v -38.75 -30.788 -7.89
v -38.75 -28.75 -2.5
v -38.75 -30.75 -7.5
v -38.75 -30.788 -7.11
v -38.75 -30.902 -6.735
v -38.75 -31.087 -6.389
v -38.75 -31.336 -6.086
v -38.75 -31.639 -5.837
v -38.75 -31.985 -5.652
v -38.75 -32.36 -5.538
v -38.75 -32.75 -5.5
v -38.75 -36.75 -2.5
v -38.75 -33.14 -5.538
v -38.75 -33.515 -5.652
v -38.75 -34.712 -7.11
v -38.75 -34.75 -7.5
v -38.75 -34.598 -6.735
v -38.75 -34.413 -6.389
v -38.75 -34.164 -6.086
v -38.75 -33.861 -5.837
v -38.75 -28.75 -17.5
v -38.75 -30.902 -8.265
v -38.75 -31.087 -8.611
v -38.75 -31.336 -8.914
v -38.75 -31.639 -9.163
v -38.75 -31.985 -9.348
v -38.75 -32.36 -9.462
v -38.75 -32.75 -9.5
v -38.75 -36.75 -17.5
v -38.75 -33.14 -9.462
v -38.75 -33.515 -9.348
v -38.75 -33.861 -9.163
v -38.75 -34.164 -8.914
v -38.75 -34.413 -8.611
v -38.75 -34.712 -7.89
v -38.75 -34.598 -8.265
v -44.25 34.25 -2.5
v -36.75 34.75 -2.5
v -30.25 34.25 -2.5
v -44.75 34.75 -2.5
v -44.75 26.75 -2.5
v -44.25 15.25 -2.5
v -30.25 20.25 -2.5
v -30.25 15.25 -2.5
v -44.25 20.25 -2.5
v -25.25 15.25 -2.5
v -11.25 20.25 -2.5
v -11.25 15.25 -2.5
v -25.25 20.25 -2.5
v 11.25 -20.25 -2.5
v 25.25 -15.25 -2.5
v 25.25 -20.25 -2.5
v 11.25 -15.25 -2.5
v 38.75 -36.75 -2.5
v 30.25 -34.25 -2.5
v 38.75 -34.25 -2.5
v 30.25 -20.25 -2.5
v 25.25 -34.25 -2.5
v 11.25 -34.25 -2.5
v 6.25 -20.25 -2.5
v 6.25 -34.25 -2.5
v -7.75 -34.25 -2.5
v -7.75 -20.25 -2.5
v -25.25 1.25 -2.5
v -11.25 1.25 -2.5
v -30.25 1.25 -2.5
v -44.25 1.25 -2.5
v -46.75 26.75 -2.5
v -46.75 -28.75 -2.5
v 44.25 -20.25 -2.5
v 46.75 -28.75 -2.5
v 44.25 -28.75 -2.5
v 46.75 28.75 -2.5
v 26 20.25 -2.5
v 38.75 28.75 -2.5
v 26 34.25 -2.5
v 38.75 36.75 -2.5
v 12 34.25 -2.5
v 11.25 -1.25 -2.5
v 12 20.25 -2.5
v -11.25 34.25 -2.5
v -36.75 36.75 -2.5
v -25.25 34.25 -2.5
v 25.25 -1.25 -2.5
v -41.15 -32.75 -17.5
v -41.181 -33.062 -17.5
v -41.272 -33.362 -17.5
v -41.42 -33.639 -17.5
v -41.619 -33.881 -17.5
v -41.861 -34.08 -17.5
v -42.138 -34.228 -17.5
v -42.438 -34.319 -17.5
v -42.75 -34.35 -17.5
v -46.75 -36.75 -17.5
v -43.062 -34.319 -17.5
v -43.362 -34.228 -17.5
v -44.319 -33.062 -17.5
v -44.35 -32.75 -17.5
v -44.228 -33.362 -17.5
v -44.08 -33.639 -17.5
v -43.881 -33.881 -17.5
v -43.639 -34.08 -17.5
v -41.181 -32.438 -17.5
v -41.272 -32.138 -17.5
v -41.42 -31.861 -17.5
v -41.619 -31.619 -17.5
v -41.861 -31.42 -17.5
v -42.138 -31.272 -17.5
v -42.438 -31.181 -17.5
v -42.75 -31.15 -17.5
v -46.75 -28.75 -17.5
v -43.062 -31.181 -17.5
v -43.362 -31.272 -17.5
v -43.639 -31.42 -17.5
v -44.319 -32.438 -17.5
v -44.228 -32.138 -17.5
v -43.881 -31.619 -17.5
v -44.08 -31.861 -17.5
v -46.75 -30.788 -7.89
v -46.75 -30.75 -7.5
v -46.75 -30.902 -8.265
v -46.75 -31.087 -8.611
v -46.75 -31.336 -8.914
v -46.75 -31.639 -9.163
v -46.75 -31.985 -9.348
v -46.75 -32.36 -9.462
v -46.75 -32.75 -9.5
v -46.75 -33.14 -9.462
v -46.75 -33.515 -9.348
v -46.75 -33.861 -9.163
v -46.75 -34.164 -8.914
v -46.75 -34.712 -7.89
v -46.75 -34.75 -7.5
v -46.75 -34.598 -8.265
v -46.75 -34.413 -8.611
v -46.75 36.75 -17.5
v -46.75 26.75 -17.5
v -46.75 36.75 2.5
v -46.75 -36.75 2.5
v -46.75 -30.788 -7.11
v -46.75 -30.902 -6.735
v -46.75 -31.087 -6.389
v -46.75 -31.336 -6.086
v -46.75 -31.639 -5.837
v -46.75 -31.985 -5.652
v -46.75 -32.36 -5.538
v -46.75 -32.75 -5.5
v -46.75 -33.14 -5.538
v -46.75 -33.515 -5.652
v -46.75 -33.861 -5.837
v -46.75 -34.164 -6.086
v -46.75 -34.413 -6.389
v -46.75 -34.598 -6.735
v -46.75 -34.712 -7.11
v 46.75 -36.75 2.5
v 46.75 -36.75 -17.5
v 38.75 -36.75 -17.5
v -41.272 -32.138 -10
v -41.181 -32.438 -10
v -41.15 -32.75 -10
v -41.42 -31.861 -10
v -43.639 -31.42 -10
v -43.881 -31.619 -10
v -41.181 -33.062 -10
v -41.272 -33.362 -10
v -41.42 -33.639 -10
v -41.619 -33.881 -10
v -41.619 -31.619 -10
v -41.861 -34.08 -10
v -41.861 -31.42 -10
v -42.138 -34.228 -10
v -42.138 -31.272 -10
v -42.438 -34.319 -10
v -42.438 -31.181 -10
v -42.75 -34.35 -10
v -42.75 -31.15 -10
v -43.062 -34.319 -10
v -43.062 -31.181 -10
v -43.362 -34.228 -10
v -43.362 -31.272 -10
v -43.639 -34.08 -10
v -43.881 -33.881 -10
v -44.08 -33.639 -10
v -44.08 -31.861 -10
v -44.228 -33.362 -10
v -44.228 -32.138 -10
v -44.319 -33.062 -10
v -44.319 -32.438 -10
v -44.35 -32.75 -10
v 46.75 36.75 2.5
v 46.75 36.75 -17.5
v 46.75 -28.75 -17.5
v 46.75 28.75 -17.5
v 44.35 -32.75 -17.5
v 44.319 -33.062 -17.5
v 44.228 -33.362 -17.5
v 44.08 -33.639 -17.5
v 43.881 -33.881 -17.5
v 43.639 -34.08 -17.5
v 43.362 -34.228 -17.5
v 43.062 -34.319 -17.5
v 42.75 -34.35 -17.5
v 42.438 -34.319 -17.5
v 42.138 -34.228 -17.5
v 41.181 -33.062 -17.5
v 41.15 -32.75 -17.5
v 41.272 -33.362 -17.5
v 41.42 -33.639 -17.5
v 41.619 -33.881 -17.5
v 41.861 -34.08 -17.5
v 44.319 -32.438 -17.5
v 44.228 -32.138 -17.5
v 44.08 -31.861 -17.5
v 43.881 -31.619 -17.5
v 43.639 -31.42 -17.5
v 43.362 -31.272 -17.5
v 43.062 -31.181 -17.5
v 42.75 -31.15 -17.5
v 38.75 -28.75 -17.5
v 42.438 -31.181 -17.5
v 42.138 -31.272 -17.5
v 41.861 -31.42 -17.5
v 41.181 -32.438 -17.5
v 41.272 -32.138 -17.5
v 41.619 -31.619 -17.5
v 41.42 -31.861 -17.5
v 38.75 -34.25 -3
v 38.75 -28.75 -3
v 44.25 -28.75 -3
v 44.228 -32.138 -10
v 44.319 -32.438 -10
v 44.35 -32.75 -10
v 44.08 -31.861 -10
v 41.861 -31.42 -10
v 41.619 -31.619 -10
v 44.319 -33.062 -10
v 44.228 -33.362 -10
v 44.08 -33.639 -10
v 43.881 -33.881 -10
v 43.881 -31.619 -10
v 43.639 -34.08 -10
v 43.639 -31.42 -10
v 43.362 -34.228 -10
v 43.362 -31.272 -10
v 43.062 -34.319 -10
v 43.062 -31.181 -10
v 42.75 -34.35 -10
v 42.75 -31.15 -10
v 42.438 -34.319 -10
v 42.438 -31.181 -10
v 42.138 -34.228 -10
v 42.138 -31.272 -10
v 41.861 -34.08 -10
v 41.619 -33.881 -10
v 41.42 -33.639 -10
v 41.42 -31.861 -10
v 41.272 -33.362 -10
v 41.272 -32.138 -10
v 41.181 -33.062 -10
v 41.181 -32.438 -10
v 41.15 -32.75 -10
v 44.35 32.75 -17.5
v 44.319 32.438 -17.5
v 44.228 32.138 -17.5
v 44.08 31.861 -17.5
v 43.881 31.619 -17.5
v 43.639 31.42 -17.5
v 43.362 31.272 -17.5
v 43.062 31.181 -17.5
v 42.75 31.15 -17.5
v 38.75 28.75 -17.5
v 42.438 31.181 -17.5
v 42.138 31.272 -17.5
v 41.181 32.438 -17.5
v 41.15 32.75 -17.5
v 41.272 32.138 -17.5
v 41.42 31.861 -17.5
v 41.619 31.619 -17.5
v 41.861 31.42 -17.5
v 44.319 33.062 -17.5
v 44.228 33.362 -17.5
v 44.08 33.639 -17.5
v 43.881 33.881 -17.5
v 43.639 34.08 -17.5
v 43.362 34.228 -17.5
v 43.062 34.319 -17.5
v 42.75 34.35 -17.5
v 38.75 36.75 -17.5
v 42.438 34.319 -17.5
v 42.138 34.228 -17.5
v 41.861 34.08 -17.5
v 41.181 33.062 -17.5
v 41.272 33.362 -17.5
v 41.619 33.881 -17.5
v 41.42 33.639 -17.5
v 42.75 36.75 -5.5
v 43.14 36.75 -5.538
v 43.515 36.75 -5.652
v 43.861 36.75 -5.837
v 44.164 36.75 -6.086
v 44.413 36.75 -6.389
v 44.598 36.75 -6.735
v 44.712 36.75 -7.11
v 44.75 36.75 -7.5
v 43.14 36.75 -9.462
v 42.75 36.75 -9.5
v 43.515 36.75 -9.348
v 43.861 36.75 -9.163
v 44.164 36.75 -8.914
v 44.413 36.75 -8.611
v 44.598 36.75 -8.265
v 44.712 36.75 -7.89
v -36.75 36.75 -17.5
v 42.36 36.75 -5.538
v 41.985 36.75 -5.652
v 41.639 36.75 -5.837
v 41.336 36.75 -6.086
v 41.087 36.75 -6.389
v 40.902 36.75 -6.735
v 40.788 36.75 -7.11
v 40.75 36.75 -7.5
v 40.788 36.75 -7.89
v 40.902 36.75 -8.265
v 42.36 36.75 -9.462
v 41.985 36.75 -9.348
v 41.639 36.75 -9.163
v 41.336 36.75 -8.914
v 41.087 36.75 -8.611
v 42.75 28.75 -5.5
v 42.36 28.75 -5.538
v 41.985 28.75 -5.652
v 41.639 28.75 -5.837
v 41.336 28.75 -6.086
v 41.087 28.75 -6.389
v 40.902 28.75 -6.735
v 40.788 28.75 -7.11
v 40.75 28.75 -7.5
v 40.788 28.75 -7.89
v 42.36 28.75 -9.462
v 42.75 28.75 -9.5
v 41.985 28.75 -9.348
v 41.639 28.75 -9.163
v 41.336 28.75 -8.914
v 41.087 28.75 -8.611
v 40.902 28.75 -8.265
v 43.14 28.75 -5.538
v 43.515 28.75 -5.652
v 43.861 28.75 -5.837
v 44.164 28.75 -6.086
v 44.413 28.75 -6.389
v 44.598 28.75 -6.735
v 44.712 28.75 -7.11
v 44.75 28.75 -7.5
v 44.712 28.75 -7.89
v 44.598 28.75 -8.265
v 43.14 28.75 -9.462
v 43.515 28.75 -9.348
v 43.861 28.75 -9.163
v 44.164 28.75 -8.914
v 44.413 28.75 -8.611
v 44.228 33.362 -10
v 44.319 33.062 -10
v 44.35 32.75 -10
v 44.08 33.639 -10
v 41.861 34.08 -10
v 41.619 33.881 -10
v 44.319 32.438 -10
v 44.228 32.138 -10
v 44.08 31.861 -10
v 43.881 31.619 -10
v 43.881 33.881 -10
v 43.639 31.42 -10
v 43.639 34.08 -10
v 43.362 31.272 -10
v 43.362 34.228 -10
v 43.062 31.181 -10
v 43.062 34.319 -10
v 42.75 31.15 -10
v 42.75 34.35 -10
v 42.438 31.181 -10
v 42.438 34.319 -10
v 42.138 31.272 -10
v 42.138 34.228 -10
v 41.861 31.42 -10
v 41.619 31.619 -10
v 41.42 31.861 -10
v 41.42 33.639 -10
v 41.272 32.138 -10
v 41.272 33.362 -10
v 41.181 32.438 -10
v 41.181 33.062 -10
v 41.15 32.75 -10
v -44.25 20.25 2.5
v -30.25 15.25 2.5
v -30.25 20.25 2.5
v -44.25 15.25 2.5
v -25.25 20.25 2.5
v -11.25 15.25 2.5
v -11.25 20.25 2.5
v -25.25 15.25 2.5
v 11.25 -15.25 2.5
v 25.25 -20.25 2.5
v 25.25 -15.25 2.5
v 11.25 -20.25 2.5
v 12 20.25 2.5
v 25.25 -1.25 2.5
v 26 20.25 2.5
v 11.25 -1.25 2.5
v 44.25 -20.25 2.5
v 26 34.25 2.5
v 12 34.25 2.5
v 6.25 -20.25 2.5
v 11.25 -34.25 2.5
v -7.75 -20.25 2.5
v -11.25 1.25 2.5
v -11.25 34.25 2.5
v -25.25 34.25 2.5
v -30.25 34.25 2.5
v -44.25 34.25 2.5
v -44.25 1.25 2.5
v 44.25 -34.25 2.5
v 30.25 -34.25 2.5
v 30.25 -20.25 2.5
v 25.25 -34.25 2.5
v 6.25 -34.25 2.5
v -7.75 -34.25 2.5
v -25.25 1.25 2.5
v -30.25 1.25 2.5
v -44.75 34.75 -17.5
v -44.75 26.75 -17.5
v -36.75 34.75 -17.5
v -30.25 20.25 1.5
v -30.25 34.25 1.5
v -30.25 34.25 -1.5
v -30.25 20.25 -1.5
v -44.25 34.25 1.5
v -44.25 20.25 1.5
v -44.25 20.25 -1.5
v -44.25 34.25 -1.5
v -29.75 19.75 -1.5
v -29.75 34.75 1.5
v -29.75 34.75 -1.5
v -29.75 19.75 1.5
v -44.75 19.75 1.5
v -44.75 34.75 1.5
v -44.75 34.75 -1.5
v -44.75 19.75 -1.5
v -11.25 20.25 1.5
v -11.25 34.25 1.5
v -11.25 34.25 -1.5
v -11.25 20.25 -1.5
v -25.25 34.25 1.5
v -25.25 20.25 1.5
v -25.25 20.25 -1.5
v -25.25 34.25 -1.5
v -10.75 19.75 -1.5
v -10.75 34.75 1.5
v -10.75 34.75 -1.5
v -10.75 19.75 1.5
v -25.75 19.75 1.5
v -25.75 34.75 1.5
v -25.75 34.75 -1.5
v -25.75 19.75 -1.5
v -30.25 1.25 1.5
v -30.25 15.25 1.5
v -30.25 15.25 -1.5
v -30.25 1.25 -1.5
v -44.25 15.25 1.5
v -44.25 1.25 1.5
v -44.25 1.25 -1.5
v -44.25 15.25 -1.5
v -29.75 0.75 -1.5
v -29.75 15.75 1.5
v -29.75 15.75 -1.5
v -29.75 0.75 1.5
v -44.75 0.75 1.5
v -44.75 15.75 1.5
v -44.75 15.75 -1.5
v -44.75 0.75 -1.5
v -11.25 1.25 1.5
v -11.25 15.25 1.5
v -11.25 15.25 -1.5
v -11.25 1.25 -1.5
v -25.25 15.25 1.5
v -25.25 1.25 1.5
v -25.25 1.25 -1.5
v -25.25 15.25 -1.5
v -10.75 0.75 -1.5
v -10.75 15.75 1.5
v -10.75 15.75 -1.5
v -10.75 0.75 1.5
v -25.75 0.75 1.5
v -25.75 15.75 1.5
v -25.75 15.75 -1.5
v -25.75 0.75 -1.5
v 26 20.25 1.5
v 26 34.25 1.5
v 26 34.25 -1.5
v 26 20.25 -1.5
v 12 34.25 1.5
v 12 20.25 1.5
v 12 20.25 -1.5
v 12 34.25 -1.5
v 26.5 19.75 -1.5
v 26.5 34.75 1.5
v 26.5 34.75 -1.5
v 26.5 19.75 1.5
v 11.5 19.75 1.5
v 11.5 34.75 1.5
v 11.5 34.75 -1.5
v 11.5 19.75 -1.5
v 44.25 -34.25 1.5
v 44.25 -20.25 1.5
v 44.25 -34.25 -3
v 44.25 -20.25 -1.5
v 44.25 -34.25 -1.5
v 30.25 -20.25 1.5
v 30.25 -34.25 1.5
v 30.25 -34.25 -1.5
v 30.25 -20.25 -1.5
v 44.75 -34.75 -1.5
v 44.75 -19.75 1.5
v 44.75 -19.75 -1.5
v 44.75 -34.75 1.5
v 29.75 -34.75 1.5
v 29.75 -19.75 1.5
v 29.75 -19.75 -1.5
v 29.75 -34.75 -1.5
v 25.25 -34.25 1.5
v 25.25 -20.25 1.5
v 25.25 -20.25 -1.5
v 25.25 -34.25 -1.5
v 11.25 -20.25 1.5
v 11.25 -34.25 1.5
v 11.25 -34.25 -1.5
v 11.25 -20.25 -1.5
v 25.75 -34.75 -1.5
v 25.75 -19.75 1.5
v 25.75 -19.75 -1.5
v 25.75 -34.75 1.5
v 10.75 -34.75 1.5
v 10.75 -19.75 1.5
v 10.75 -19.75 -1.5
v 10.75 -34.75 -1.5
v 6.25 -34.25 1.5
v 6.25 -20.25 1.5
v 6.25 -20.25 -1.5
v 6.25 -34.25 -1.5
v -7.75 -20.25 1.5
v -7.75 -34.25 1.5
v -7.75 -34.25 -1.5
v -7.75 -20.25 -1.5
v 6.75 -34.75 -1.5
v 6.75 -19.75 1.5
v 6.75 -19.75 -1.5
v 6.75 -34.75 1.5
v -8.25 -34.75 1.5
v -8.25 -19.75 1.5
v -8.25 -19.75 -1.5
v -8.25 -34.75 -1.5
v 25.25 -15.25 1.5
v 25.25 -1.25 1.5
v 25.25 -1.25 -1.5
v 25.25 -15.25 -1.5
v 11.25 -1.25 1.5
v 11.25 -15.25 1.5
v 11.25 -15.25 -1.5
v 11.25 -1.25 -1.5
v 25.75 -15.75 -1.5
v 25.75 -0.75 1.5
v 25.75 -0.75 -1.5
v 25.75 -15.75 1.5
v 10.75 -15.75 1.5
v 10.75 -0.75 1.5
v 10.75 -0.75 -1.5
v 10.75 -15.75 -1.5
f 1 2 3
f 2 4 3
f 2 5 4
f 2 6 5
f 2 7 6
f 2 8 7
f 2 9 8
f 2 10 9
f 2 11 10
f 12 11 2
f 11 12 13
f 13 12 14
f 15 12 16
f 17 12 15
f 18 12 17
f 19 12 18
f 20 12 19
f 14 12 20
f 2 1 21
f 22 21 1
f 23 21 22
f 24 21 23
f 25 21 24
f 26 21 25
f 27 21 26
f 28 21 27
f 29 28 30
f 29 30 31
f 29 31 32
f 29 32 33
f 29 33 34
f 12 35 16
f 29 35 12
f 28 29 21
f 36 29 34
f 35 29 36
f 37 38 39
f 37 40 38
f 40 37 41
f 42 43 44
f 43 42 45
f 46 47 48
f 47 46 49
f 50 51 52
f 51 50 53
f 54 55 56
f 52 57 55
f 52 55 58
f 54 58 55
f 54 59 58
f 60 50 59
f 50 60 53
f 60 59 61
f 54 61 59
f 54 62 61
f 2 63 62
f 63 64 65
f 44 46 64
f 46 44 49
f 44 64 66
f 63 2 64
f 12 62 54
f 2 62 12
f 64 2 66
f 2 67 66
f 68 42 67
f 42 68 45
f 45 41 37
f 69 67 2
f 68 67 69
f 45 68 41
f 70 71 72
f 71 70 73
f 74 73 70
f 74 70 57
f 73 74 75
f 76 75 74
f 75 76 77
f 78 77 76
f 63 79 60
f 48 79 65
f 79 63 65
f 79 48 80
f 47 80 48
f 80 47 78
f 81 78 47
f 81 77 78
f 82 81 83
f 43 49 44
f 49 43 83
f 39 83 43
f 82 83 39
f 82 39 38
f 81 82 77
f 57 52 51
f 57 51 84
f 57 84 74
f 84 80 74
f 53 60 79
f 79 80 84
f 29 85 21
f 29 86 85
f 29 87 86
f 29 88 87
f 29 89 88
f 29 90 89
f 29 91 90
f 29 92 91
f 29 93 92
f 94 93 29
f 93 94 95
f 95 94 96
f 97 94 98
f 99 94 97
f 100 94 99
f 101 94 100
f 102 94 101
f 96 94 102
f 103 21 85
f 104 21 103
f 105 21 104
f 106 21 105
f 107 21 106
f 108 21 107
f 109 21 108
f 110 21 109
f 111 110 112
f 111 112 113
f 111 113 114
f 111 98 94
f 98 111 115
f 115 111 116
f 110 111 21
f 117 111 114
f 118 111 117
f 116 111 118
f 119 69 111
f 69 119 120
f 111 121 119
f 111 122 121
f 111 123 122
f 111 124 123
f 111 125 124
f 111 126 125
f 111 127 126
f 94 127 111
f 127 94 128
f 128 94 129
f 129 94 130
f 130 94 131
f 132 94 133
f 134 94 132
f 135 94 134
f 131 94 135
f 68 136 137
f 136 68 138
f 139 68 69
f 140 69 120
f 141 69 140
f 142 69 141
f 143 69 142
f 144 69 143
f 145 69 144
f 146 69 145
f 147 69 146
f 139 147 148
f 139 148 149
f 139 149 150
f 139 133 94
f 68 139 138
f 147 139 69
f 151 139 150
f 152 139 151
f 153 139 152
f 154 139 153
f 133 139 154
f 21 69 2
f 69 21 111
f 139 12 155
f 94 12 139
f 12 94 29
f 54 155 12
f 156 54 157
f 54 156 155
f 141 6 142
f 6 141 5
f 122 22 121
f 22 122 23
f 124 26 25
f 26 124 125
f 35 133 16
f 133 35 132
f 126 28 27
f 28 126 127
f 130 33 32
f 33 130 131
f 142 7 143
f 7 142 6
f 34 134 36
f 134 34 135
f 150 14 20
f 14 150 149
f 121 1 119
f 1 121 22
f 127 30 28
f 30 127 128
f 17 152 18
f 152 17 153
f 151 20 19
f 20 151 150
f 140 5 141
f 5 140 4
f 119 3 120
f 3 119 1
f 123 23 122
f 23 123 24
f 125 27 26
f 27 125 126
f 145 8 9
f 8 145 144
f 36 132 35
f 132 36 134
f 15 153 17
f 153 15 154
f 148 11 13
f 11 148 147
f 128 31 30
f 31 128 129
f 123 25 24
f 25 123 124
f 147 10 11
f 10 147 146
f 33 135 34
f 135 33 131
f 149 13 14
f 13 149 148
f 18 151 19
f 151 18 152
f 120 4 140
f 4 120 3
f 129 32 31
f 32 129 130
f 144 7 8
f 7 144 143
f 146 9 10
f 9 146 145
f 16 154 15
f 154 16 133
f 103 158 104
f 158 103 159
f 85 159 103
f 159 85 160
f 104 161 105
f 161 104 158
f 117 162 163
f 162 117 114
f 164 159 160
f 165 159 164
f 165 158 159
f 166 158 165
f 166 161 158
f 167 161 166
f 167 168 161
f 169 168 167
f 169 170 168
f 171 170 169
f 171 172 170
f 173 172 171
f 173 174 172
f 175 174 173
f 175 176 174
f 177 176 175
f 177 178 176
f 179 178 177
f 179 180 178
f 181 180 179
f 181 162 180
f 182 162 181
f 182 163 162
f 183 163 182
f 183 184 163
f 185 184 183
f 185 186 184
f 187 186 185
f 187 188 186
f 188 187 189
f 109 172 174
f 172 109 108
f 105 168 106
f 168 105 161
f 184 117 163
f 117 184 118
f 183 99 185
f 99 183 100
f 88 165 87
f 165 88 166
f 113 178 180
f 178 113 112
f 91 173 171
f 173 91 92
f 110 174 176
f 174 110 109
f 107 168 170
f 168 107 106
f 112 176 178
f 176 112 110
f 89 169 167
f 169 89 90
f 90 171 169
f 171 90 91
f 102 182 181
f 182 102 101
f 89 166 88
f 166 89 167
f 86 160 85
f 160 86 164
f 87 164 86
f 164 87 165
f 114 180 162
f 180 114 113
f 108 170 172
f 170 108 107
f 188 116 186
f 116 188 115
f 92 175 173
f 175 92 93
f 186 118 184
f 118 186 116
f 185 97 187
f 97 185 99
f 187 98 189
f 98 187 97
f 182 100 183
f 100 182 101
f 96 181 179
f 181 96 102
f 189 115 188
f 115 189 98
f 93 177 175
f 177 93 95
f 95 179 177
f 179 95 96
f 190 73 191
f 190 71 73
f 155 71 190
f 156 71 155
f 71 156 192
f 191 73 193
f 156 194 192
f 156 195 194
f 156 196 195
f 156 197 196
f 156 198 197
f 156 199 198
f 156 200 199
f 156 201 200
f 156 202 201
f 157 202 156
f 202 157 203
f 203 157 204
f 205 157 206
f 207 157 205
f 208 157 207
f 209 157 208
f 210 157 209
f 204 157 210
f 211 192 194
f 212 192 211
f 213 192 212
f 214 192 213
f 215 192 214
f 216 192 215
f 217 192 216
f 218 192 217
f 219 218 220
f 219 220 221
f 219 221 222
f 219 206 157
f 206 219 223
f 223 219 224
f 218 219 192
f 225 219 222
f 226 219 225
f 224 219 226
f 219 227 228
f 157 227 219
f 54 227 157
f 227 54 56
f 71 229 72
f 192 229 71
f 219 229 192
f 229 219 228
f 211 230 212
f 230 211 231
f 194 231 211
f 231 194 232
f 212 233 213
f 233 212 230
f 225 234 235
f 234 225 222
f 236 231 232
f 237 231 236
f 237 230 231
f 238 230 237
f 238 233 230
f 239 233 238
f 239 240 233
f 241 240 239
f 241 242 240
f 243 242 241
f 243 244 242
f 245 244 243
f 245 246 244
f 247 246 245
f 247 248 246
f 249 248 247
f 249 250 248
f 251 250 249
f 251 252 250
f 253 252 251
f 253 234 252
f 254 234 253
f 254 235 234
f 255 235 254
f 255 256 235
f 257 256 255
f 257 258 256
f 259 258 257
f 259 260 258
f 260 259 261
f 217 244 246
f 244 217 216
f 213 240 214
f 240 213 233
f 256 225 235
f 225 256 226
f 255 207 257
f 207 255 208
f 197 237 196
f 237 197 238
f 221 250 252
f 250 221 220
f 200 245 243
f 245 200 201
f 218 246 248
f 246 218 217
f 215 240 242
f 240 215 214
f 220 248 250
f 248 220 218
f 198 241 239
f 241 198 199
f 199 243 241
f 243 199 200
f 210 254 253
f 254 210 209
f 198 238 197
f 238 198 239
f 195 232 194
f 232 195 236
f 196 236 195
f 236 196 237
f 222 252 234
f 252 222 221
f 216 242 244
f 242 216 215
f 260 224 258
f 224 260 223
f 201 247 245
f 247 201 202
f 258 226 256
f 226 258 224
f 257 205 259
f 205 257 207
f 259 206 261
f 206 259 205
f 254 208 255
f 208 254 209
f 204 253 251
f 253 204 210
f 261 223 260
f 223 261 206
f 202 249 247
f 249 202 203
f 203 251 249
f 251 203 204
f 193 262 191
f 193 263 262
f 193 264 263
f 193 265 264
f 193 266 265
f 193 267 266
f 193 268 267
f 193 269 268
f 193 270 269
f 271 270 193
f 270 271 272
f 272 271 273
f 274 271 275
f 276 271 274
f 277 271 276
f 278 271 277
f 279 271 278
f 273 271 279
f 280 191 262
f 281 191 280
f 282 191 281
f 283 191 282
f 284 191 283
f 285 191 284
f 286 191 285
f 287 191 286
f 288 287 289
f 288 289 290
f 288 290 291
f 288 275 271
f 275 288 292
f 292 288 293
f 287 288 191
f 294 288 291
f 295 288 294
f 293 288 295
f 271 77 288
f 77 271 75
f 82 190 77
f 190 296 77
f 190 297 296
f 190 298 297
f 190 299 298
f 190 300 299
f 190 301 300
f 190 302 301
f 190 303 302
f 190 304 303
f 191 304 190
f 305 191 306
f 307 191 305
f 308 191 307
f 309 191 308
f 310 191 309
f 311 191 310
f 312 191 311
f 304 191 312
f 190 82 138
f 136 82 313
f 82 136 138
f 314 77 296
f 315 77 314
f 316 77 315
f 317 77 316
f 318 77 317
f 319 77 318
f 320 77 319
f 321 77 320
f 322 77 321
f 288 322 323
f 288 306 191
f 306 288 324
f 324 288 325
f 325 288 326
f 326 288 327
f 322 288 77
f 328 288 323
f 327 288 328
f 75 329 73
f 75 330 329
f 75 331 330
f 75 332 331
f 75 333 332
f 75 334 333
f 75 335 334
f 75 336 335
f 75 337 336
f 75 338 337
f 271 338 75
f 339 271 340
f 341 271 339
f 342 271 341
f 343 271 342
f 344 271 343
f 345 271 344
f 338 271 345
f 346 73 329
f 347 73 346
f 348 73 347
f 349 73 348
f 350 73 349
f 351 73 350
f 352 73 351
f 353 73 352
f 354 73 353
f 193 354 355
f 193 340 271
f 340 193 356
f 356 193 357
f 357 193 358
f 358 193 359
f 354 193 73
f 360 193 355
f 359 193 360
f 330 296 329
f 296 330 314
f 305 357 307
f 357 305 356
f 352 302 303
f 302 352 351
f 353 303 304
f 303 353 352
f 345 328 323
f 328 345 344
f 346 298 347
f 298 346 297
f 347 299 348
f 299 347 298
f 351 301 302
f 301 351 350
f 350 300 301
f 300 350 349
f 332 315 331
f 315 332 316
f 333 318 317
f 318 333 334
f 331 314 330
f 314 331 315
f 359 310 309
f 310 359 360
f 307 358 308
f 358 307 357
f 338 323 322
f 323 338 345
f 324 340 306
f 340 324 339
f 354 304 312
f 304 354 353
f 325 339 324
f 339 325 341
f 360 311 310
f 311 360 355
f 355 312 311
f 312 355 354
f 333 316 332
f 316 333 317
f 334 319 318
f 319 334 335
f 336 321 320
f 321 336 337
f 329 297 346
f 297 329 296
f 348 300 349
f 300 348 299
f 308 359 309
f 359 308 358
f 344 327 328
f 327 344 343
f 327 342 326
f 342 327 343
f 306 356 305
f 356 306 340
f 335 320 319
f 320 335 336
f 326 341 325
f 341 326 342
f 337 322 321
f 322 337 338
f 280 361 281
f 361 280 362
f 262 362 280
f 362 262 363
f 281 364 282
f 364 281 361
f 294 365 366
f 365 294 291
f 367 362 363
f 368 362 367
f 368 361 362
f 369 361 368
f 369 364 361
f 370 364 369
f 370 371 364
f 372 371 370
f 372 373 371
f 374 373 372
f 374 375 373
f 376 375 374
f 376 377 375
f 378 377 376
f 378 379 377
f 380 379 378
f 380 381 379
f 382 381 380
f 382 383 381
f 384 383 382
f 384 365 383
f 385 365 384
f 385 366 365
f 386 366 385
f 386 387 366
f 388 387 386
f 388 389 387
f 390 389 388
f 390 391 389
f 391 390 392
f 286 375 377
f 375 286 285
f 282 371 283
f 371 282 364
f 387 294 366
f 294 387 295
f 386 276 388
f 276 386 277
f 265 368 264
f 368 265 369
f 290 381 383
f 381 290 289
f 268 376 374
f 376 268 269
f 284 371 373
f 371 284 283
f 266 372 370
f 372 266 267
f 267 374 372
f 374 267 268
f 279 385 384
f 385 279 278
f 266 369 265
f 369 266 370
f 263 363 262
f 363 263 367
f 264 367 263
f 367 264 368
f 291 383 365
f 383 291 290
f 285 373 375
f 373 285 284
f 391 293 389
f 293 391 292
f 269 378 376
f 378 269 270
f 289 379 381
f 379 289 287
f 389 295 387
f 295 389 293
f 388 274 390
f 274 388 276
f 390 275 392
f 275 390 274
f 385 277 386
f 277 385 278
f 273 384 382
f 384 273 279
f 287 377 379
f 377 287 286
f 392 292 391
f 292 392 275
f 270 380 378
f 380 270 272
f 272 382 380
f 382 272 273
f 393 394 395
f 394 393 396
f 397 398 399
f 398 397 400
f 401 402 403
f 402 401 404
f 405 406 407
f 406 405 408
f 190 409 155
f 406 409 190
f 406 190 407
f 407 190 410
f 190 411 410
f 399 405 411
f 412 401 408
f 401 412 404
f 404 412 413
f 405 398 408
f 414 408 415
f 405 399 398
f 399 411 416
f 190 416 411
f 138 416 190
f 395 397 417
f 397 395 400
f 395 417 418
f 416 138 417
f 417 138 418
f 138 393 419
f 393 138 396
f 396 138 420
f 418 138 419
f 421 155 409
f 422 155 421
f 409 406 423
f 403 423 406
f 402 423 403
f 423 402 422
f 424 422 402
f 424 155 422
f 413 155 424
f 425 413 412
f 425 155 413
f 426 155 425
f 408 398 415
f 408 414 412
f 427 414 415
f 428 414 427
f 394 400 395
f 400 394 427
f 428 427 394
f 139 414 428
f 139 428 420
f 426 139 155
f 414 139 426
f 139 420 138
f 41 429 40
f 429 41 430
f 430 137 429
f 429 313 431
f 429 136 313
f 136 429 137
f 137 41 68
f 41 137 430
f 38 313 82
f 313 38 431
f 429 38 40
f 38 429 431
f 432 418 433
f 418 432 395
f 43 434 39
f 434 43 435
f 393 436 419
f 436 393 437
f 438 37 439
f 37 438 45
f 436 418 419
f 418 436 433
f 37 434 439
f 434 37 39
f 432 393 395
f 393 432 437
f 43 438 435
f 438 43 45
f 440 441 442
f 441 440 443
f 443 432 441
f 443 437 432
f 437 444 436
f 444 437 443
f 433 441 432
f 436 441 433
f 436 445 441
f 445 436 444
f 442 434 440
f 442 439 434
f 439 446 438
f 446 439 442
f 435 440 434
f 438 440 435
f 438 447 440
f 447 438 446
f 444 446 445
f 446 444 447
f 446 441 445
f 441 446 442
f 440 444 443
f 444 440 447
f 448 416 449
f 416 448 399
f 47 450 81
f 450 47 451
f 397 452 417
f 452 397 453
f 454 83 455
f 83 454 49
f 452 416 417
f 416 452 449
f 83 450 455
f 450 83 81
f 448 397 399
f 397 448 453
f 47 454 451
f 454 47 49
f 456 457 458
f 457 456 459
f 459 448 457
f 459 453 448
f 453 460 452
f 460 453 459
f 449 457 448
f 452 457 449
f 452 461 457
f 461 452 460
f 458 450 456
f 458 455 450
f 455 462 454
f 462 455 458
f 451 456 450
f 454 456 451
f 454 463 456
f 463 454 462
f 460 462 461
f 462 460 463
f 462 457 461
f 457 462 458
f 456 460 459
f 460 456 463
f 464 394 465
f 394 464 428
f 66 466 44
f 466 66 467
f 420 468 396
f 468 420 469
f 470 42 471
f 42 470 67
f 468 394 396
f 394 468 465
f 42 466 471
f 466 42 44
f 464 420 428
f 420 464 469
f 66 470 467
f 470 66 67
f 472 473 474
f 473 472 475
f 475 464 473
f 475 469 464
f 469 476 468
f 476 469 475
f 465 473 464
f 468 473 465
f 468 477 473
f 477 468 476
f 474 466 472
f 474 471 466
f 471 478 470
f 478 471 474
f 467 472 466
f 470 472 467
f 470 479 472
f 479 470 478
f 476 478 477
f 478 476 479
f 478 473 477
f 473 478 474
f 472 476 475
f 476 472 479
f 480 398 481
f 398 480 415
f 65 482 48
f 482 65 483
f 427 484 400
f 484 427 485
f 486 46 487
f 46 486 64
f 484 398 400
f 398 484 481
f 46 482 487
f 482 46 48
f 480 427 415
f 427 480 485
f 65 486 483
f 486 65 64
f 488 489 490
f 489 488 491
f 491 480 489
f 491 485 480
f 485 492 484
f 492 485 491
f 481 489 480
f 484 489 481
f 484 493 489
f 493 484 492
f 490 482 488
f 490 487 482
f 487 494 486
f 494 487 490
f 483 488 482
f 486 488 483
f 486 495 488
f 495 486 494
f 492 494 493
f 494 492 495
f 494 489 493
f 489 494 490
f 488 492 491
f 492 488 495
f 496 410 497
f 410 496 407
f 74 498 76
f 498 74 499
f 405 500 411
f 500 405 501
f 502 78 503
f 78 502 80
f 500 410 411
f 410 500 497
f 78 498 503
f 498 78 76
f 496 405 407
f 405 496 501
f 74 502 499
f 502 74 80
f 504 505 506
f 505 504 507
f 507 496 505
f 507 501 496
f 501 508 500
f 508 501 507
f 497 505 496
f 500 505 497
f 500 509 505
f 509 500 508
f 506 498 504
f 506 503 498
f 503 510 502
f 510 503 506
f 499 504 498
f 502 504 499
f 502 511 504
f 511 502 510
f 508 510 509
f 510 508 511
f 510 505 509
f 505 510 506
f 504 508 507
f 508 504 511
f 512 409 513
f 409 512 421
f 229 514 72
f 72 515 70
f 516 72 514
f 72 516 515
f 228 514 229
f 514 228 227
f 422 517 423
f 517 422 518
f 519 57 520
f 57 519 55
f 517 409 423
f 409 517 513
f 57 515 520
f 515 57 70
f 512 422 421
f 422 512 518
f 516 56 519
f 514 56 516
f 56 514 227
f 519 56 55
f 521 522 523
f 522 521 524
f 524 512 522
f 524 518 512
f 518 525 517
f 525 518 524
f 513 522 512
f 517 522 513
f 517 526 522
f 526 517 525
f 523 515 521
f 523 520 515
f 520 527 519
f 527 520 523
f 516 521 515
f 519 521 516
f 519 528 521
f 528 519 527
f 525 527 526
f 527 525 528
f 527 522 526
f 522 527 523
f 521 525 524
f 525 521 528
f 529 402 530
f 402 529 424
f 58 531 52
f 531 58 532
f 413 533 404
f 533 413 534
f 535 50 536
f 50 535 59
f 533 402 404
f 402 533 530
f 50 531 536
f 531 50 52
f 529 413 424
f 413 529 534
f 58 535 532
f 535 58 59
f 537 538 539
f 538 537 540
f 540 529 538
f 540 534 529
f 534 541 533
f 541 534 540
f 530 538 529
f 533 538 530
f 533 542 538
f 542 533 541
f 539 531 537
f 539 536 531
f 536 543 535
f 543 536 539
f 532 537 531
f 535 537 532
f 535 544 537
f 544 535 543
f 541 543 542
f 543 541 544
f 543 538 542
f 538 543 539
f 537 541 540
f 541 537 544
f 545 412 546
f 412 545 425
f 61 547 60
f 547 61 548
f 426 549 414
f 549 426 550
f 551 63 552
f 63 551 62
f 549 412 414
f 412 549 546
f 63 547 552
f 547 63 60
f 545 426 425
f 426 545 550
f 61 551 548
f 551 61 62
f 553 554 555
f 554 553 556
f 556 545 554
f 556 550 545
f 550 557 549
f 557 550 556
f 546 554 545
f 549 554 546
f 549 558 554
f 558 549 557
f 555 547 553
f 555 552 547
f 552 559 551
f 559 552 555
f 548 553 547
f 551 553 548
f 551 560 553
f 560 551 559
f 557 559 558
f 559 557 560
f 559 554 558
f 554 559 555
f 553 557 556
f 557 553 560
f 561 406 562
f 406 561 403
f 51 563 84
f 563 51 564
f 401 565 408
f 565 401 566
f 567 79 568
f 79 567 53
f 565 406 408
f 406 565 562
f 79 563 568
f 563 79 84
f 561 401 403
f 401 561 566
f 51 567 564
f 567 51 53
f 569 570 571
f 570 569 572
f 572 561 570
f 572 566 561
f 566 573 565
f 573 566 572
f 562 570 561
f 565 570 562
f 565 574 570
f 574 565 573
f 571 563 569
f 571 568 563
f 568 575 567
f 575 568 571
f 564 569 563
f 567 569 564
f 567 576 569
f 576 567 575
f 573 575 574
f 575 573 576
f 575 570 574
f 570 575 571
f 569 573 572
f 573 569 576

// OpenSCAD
// file: common.scad
key_size = 14;
stabilizer_size = 3.5;

b_post = 8;
m_post_s = 2;
m_post_l = 10;
post_z = 15;

plat_z = 5;

module keyhole(x, y) {
  translate([x, y, 0]) {
    cube([key_size, key_size, plat_z + 1], center = true);
    cube([key_size + 1, key_size + 1, plat_z - 2], center = true);
  }
}

module double_wide(x, y) {
  keyhole(x, y);
  for (offset=[-12, 12]) {
     translate([x + offset, y - 1, 0]) {
       cube([stabilizer_size, key_size, plat_z + 1], center = true);
       translate([0, key_size/2, 0])
         cube([stabilizer_size, 1, plat_z - 2], center = true);
       translate([0, -key_size/2, 0])
         cube([stabilizer_size, 2, plat_z - 2], center = true);
     }
  }
}

module e_post(x, y, z) {
  translate([x, y, -(plat_z + post_z)/2]) {
    difference() {
      cube([b_post, b_post, post_z], center = true);
      translate([0, 0, -post_z/2]) cylinder(h=post_z, r=1.6, center=true, $fn=32);
    }
  }
}

module e_post_i(x, y, r) {
  translate([x, y, -(plat_z + post_z)/2]) {
    difference() {
      cube([b_post, b_post, post_z], center = true);
      translate([0, 0, post_z/6]) rotate(r) cylinder(h=b_post+1, r=2, center=true, $fn=32);
      translate([0, 0, -post_z/2]) cylinder(h=post_z, r=1.6, center=true, $fn=32);
    }
  }
}

module e_post_x(x, y) {
  e_post_i(x, y, [0, 90, 0]);
}


module e_post_y(x, y) {
  e_post_i(x, y, [90, 0, 0]);
}

module i_post_x(x, y) {
  translate([x, y, -(plat_z + post_z)/2]) cube([m_post_l, m_post_s, post_z], center = true);
}

module i_post_y(x, y) {
  translate([x, y, -(plat_z + post_z)/2]) cube([m_post_s, m_post_l, post_z], center = true);
}
// file: parameters.scad
key_size = 14;
key_sep = 5;
m_key_sep = 13.5;
l_key_sep = 33;

border = 8;
b_post = 8;
m_post_s = 2;
m_post_l = 10;
post_z = 15;

key_cell = key_size + key_sep;
m_key_cell_x = key_size + m_key_sep;
l_key_cell_x = 2*key_cell;

plat_z = 5;
// main file
// Alien bat section 8: bottom left

include <parameters.scad>

plat_x = 4 * key_cell + key_cell/2 + border;
plat_y = 2 * key_cell + m_key_cell_x + border;

use <common.scad>

difference() {
  union() {
    cube([plat_x, plat_y, 5], center = true);
    e_post_x(-(plat_x-b_post)/2, -(plat_y-b_post)/2);
    e_post((plat_x-b_post)/2, -(plat_y-b_post)/2);
    e_post_y((plat_x-b_post)/2, (plat_y-b_post)/2);

    i_post_y(-(plat_x-m_post_s)/2, (plat_y-m_post_l)/2);
    i_post_x(-(plat_x-m_post_l)/2, (plat_y-m_post_s)/2);
  }
  keyhole(-plat_x/2 + key_cell/2, plat_y/2 - key_cell/2);
  keyhole(-plat_x/2 + key_cell + key_cell/2, plat_y/2 - key_cell/2);
  keyhole(-plat_x/2 + key_cell/2, plat_y/2 - key_cell - key_cell/2);
  keyhole(-plat_x/2 + key_cell + key_cell/2, plat_y/2 - key_cell - key_cell/2);
  keyhole(l_key_cell_x/2, plat_y/2 - key_cell/2);

  for (col = [0:2]) {
    keyhole(plat_x/2 - col*key_cell - key_cell/2, -plat_y/2 + key_cell/2);
  }
  keyhole(plat_x/2 - key_cell - key_cell/2, -plat_y/2 + key_cell + key_cell/2);
}
